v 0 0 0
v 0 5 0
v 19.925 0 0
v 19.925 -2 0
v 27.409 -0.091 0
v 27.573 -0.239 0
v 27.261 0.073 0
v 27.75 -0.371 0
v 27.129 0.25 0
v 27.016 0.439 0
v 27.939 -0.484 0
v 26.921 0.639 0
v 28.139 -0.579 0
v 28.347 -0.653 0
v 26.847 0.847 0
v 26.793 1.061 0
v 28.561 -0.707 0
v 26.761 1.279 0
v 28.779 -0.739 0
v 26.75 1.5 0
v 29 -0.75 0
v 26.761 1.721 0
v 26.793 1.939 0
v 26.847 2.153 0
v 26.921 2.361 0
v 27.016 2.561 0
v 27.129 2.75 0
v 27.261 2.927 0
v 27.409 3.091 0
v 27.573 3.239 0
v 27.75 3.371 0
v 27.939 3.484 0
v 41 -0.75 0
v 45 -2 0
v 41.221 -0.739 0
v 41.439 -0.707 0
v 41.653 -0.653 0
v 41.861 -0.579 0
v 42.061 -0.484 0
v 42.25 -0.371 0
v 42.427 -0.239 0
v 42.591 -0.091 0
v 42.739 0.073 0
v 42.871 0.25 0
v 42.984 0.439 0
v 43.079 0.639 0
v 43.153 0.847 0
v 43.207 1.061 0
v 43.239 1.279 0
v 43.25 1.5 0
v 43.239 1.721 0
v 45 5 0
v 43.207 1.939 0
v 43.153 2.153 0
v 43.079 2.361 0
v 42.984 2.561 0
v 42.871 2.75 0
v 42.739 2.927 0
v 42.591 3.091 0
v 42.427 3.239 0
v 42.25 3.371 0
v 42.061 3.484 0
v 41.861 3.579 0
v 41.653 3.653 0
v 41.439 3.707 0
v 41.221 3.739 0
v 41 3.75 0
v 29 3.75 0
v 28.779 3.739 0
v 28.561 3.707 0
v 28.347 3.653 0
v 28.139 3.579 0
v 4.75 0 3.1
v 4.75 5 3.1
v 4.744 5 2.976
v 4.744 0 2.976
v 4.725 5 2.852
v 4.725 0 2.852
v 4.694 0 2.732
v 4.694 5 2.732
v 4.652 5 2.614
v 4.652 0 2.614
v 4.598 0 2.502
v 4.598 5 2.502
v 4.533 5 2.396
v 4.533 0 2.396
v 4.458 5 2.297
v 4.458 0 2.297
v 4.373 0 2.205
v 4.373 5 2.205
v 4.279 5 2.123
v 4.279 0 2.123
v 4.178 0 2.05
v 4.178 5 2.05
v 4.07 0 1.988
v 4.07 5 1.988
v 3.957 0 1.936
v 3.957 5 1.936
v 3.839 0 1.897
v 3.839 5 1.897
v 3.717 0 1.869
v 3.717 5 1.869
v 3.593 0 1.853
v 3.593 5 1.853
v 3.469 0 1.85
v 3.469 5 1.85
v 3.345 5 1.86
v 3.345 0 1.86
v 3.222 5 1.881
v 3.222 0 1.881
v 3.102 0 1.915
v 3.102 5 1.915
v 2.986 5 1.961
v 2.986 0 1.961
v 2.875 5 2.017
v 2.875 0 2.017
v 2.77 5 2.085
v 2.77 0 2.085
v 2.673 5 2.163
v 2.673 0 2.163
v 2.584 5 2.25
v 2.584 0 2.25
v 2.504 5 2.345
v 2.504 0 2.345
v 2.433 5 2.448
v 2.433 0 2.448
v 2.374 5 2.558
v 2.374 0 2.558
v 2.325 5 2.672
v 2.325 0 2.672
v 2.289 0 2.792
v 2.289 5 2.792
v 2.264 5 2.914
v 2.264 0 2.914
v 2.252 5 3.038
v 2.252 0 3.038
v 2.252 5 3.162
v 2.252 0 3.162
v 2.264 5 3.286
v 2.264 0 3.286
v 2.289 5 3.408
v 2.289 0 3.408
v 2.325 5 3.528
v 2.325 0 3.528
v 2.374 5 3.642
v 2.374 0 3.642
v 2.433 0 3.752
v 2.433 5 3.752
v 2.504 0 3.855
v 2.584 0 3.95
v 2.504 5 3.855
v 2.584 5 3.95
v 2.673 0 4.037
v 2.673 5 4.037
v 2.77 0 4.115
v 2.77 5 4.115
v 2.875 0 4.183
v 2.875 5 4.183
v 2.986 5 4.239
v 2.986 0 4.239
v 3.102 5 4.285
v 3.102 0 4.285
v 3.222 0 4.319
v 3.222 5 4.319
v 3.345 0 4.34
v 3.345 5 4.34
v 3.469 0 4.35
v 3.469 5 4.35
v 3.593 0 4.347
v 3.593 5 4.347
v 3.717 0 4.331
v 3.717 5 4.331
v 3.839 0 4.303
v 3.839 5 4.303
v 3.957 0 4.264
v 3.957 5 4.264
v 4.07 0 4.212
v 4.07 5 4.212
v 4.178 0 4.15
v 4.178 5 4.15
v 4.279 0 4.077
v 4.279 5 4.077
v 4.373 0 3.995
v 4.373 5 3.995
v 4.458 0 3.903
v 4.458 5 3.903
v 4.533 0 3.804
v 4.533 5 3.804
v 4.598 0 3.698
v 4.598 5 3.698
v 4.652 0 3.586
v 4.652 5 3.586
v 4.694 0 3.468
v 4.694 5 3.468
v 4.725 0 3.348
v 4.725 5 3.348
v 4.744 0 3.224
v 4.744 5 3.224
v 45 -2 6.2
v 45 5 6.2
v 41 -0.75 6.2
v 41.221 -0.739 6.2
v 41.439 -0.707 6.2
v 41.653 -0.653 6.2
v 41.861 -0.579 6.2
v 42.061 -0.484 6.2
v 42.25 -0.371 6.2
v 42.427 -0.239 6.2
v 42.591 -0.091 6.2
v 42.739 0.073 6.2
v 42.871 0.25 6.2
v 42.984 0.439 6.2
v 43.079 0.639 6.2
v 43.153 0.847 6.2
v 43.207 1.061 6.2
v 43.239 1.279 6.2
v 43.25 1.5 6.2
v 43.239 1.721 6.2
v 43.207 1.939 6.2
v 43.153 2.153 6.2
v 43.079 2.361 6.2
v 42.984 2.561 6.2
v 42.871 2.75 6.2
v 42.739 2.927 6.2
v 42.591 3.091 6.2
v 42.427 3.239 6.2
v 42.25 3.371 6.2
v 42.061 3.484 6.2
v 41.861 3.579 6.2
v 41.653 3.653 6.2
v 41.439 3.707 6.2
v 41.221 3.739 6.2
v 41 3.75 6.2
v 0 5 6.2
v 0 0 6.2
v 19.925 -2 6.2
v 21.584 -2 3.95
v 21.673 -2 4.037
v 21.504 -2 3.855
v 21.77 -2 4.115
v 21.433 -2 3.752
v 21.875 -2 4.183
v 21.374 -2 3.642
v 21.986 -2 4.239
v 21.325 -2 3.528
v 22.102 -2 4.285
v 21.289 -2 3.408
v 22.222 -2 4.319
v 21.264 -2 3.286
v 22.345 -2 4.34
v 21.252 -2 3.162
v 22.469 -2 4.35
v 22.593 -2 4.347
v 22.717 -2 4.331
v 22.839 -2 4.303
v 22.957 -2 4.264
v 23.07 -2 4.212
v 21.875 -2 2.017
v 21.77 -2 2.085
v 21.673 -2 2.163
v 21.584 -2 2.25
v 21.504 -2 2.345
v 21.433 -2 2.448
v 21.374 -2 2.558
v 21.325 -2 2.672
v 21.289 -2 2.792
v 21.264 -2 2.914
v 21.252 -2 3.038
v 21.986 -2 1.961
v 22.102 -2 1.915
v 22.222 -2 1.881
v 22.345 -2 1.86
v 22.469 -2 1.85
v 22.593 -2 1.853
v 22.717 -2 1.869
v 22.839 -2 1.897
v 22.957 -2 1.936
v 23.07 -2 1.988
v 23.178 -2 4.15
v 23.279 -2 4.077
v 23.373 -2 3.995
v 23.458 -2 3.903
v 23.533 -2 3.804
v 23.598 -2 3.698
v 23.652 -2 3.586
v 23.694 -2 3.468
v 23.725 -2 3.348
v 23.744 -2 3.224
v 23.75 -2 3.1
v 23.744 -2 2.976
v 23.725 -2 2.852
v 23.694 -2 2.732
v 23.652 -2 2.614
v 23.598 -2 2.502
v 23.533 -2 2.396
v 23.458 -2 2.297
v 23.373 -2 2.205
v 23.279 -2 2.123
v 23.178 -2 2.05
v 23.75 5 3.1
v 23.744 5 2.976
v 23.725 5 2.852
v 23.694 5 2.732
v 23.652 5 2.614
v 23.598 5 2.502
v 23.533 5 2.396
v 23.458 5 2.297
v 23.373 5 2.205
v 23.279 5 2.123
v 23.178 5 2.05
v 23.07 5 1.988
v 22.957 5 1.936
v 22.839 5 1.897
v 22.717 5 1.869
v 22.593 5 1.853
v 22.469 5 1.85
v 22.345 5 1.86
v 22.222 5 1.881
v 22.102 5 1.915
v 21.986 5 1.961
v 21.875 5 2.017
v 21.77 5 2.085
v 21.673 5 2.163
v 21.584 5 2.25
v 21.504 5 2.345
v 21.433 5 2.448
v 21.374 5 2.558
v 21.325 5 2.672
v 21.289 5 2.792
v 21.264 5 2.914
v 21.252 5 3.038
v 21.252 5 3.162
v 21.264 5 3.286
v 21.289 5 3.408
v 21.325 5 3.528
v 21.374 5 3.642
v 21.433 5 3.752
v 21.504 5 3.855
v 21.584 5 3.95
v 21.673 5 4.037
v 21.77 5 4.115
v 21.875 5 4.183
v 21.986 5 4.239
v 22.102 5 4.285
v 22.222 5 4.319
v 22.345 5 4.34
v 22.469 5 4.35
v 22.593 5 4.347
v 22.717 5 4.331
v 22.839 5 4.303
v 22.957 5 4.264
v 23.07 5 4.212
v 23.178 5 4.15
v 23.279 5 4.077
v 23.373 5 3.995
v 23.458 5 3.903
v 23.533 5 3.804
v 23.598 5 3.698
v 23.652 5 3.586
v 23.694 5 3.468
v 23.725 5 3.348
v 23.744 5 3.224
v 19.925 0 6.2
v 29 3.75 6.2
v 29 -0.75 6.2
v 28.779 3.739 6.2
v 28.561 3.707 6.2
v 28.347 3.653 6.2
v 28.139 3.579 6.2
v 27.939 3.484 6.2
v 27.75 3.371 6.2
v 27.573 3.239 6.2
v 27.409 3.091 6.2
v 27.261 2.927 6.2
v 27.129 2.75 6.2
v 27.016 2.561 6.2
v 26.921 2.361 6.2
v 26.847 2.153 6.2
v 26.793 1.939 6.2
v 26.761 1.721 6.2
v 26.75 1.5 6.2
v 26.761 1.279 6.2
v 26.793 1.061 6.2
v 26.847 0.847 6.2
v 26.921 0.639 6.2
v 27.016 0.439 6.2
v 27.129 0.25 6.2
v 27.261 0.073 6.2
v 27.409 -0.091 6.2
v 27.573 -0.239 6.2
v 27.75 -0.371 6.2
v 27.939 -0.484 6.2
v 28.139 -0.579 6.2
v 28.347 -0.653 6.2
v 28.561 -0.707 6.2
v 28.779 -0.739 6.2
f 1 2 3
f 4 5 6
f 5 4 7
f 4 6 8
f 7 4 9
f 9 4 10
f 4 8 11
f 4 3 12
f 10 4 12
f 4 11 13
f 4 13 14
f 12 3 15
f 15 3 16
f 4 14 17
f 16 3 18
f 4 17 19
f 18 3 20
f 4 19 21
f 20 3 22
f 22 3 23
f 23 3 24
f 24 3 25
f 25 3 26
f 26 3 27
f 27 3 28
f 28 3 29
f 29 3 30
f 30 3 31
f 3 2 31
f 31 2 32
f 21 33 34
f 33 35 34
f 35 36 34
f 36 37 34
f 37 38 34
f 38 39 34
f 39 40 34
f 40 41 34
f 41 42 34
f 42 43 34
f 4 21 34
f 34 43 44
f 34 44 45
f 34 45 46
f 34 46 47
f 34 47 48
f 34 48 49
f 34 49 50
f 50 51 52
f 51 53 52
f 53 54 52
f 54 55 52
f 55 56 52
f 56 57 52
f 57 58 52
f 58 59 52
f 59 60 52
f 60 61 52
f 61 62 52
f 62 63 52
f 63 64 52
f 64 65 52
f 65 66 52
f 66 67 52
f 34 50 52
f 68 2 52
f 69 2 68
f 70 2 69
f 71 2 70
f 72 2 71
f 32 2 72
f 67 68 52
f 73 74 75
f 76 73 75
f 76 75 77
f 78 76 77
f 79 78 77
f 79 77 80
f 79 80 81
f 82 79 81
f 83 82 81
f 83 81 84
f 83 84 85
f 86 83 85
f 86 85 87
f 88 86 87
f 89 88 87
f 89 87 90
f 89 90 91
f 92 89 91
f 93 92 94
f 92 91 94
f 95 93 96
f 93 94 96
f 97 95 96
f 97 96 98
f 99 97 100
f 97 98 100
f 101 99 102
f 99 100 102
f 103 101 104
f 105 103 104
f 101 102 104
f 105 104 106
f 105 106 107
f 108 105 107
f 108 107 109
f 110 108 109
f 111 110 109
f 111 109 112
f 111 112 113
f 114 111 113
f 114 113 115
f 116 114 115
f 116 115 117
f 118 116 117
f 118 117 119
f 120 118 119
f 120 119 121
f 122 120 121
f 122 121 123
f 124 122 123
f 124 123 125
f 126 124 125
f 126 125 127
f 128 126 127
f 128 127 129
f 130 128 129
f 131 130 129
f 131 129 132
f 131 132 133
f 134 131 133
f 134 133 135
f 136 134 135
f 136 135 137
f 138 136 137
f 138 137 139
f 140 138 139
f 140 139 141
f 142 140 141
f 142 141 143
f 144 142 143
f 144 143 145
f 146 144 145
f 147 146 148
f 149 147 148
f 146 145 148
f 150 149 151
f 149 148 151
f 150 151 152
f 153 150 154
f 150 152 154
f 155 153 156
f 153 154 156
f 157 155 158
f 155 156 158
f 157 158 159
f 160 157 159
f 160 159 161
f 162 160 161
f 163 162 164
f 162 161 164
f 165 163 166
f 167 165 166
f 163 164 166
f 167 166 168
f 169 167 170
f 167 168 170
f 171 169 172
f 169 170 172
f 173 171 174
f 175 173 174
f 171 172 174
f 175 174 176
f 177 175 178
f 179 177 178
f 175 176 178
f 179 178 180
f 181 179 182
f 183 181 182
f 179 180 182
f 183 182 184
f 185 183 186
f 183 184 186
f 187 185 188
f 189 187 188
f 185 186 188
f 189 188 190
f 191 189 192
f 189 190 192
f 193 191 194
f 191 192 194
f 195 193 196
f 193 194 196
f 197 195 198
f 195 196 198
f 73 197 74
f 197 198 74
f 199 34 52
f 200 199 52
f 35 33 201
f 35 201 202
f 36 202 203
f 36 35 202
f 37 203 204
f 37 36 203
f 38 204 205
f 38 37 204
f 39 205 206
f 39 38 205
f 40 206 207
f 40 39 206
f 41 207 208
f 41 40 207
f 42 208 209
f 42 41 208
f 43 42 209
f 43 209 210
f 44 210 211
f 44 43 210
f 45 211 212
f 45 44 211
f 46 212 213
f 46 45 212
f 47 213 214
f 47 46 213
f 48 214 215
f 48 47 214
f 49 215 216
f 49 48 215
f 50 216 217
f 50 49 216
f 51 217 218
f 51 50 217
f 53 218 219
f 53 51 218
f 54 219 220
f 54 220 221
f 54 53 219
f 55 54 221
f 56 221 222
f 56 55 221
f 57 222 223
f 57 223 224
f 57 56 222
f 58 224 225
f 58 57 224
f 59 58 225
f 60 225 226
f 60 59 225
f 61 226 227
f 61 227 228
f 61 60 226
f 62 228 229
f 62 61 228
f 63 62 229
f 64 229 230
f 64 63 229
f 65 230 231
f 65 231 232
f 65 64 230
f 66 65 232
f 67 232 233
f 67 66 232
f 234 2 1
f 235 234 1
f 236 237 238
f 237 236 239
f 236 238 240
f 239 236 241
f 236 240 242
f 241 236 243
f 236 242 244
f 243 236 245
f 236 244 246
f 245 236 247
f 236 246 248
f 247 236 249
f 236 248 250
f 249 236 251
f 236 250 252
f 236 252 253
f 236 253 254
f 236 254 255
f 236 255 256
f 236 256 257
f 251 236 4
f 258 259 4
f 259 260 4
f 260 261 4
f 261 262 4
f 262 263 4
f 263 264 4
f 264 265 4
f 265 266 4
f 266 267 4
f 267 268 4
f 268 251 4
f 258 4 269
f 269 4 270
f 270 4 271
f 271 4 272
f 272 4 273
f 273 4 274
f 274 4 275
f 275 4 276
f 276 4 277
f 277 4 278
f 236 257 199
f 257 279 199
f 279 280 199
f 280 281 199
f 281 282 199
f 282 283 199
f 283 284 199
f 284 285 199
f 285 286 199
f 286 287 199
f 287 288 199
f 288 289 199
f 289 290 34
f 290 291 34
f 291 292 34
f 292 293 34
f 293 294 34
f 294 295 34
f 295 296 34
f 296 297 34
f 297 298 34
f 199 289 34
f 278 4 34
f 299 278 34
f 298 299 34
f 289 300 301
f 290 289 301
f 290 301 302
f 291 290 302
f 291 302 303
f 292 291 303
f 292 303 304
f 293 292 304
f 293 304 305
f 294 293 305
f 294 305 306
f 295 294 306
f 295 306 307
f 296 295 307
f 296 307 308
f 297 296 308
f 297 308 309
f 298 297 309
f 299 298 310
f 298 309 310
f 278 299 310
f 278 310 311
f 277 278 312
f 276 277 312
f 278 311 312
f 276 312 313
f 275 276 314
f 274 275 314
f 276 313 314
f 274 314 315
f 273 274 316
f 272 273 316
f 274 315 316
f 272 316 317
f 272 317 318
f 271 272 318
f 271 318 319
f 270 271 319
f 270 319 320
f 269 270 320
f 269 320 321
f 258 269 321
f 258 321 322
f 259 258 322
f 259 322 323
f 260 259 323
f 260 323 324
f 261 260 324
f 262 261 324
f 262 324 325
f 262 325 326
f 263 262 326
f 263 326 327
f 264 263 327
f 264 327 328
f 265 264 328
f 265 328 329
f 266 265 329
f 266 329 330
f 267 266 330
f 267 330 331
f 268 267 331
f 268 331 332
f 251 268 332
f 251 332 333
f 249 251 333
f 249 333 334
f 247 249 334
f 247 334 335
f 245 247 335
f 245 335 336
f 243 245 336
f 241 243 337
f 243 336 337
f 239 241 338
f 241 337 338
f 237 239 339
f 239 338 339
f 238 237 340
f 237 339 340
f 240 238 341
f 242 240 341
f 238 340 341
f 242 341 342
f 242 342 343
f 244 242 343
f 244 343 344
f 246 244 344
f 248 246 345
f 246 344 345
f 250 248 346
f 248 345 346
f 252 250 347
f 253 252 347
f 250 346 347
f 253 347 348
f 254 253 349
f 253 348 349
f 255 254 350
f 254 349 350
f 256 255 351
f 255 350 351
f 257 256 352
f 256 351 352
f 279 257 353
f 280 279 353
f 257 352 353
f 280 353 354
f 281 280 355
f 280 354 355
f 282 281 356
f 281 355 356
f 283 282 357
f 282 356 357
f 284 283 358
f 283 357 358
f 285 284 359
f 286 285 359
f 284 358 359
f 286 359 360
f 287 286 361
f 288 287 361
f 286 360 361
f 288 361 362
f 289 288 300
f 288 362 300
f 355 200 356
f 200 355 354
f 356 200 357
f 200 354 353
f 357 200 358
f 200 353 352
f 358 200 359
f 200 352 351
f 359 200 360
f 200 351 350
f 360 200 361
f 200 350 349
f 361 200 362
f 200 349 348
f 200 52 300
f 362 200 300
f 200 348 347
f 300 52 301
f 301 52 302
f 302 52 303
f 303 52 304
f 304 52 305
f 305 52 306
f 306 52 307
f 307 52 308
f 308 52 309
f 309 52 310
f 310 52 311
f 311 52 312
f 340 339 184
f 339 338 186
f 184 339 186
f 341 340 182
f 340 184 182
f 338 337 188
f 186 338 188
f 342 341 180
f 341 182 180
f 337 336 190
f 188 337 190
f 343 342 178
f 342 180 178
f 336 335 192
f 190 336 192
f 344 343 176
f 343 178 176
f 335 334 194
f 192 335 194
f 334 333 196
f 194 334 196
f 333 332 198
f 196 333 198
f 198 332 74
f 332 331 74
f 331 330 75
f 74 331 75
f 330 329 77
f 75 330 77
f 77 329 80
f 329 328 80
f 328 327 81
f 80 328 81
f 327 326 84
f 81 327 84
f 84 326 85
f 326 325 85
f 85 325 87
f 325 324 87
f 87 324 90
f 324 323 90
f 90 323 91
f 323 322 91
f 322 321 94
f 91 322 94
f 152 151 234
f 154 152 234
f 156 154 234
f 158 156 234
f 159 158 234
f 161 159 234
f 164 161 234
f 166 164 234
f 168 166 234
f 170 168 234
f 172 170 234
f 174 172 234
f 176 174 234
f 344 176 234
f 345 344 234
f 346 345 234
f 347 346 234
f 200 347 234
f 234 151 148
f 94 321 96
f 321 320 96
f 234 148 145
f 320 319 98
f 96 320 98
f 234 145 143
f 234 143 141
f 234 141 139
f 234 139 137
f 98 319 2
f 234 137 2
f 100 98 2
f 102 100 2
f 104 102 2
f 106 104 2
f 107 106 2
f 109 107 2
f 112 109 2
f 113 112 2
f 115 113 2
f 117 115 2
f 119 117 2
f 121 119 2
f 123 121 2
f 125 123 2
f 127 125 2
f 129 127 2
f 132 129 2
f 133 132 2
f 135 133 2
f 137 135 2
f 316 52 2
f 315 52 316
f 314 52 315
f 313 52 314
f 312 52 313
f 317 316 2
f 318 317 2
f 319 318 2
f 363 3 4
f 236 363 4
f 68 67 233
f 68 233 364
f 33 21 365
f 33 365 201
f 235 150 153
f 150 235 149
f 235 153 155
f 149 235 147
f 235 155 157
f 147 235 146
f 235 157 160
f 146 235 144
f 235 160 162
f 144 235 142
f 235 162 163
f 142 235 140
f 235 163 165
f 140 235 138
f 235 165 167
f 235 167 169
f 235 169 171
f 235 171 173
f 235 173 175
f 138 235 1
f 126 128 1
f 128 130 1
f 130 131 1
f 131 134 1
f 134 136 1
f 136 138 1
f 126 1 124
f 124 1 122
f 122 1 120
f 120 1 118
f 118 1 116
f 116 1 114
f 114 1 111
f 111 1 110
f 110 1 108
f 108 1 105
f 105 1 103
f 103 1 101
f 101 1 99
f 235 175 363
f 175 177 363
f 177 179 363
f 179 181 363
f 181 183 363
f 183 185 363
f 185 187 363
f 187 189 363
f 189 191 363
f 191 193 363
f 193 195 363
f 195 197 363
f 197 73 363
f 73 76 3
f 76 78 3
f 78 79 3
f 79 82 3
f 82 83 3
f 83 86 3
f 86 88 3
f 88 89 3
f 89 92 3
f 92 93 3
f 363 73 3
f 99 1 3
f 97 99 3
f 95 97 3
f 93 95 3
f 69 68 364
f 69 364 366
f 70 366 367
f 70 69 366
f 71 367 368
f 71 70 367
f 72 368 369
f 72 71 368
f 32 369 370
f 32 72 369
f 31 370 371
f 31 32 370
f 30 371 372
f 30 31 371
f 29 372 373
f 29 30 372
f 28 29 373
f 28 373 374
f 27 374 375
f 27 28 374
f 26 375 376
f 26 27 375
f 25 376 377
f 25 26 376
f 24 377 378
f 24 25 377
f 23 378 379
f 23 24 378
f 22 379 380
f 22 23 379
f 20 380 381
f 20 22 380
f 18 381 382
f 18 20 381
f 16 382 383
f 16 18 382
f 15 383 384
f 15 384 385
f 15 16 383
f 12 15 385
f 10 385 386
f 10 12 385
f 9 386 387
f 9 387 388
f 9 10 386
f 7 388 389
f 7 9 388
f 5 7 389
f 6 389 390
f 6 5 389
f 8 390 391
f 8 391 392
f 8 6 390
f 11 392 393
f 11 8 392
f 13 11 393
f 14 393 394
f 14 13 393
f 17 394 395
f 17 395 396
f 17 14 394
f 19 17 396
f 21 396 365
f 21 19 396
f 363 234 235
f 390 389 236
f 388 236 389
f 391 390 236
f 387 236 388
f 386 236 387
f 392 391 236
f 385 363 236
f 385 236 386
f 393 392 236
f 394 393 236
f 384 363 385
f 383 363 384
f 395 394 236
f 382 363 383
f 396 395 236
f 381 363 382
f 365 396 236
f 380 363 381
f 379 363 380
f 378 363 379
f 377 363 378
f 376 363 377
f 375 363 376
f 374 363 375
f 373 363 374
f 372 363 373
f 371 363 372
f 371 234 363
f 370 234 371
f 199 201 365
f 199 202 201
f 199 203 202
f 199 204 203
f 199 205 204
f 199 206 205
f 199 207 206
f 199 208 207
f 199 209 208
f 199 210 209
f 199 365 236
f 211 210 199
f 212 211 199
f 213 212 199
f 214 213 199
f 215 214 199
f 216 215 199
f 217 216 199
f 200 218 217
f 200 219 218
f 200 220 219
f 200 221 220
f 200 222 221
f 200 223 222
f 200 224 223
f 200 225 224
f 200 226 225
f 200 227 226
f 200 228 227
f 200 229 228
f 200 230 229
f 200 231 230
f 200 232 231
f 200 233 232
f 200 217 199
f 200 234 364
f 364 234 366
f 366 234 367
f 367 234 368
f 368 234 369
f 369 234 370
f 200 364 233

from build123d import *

# Parameters (mm, degrees)
EXTRUDE_2_DEPTH    = 6.2
HOLE_WIZARD_M3_1_D = 2.5


with BuildPart() as part:
    # 草图1 → 凸台-拉伸2 (new body)
    with BuildSketch(Plane.XY):
        Polygon((45, 5), (0, 5), (0, 0), (19.924787558, 0), (19.924787558, -2), (45, -2), align=None)
        with BuildLine():
            Line((29, -0.75), (41, -0.75))
            ThreePointArc((41, -0.75), (43.25, 1.5), (41, 3.75))
            Line((41, 3.75), (29, 3.75))
            ThreePointArc((29, 3.75), (26.75, 1.5), (29, -0.75))
        make_face(mode=Mode.SUBTRACT)
    extrude(amount=EXTRUDE_2_DEPTH)

    # M3 螺纹孔1 (through all)
    with Locations(Plane(origin=(0, -2, 0), x_dir=(-1, 0, 0), z_dir=(0, -1, 0))):
        with Locations((-22.5, -3.1), (-3.5, -3.1)):
            Hole(HOLE_WIZARD_M3_1_D / 2)


solid = part.part
